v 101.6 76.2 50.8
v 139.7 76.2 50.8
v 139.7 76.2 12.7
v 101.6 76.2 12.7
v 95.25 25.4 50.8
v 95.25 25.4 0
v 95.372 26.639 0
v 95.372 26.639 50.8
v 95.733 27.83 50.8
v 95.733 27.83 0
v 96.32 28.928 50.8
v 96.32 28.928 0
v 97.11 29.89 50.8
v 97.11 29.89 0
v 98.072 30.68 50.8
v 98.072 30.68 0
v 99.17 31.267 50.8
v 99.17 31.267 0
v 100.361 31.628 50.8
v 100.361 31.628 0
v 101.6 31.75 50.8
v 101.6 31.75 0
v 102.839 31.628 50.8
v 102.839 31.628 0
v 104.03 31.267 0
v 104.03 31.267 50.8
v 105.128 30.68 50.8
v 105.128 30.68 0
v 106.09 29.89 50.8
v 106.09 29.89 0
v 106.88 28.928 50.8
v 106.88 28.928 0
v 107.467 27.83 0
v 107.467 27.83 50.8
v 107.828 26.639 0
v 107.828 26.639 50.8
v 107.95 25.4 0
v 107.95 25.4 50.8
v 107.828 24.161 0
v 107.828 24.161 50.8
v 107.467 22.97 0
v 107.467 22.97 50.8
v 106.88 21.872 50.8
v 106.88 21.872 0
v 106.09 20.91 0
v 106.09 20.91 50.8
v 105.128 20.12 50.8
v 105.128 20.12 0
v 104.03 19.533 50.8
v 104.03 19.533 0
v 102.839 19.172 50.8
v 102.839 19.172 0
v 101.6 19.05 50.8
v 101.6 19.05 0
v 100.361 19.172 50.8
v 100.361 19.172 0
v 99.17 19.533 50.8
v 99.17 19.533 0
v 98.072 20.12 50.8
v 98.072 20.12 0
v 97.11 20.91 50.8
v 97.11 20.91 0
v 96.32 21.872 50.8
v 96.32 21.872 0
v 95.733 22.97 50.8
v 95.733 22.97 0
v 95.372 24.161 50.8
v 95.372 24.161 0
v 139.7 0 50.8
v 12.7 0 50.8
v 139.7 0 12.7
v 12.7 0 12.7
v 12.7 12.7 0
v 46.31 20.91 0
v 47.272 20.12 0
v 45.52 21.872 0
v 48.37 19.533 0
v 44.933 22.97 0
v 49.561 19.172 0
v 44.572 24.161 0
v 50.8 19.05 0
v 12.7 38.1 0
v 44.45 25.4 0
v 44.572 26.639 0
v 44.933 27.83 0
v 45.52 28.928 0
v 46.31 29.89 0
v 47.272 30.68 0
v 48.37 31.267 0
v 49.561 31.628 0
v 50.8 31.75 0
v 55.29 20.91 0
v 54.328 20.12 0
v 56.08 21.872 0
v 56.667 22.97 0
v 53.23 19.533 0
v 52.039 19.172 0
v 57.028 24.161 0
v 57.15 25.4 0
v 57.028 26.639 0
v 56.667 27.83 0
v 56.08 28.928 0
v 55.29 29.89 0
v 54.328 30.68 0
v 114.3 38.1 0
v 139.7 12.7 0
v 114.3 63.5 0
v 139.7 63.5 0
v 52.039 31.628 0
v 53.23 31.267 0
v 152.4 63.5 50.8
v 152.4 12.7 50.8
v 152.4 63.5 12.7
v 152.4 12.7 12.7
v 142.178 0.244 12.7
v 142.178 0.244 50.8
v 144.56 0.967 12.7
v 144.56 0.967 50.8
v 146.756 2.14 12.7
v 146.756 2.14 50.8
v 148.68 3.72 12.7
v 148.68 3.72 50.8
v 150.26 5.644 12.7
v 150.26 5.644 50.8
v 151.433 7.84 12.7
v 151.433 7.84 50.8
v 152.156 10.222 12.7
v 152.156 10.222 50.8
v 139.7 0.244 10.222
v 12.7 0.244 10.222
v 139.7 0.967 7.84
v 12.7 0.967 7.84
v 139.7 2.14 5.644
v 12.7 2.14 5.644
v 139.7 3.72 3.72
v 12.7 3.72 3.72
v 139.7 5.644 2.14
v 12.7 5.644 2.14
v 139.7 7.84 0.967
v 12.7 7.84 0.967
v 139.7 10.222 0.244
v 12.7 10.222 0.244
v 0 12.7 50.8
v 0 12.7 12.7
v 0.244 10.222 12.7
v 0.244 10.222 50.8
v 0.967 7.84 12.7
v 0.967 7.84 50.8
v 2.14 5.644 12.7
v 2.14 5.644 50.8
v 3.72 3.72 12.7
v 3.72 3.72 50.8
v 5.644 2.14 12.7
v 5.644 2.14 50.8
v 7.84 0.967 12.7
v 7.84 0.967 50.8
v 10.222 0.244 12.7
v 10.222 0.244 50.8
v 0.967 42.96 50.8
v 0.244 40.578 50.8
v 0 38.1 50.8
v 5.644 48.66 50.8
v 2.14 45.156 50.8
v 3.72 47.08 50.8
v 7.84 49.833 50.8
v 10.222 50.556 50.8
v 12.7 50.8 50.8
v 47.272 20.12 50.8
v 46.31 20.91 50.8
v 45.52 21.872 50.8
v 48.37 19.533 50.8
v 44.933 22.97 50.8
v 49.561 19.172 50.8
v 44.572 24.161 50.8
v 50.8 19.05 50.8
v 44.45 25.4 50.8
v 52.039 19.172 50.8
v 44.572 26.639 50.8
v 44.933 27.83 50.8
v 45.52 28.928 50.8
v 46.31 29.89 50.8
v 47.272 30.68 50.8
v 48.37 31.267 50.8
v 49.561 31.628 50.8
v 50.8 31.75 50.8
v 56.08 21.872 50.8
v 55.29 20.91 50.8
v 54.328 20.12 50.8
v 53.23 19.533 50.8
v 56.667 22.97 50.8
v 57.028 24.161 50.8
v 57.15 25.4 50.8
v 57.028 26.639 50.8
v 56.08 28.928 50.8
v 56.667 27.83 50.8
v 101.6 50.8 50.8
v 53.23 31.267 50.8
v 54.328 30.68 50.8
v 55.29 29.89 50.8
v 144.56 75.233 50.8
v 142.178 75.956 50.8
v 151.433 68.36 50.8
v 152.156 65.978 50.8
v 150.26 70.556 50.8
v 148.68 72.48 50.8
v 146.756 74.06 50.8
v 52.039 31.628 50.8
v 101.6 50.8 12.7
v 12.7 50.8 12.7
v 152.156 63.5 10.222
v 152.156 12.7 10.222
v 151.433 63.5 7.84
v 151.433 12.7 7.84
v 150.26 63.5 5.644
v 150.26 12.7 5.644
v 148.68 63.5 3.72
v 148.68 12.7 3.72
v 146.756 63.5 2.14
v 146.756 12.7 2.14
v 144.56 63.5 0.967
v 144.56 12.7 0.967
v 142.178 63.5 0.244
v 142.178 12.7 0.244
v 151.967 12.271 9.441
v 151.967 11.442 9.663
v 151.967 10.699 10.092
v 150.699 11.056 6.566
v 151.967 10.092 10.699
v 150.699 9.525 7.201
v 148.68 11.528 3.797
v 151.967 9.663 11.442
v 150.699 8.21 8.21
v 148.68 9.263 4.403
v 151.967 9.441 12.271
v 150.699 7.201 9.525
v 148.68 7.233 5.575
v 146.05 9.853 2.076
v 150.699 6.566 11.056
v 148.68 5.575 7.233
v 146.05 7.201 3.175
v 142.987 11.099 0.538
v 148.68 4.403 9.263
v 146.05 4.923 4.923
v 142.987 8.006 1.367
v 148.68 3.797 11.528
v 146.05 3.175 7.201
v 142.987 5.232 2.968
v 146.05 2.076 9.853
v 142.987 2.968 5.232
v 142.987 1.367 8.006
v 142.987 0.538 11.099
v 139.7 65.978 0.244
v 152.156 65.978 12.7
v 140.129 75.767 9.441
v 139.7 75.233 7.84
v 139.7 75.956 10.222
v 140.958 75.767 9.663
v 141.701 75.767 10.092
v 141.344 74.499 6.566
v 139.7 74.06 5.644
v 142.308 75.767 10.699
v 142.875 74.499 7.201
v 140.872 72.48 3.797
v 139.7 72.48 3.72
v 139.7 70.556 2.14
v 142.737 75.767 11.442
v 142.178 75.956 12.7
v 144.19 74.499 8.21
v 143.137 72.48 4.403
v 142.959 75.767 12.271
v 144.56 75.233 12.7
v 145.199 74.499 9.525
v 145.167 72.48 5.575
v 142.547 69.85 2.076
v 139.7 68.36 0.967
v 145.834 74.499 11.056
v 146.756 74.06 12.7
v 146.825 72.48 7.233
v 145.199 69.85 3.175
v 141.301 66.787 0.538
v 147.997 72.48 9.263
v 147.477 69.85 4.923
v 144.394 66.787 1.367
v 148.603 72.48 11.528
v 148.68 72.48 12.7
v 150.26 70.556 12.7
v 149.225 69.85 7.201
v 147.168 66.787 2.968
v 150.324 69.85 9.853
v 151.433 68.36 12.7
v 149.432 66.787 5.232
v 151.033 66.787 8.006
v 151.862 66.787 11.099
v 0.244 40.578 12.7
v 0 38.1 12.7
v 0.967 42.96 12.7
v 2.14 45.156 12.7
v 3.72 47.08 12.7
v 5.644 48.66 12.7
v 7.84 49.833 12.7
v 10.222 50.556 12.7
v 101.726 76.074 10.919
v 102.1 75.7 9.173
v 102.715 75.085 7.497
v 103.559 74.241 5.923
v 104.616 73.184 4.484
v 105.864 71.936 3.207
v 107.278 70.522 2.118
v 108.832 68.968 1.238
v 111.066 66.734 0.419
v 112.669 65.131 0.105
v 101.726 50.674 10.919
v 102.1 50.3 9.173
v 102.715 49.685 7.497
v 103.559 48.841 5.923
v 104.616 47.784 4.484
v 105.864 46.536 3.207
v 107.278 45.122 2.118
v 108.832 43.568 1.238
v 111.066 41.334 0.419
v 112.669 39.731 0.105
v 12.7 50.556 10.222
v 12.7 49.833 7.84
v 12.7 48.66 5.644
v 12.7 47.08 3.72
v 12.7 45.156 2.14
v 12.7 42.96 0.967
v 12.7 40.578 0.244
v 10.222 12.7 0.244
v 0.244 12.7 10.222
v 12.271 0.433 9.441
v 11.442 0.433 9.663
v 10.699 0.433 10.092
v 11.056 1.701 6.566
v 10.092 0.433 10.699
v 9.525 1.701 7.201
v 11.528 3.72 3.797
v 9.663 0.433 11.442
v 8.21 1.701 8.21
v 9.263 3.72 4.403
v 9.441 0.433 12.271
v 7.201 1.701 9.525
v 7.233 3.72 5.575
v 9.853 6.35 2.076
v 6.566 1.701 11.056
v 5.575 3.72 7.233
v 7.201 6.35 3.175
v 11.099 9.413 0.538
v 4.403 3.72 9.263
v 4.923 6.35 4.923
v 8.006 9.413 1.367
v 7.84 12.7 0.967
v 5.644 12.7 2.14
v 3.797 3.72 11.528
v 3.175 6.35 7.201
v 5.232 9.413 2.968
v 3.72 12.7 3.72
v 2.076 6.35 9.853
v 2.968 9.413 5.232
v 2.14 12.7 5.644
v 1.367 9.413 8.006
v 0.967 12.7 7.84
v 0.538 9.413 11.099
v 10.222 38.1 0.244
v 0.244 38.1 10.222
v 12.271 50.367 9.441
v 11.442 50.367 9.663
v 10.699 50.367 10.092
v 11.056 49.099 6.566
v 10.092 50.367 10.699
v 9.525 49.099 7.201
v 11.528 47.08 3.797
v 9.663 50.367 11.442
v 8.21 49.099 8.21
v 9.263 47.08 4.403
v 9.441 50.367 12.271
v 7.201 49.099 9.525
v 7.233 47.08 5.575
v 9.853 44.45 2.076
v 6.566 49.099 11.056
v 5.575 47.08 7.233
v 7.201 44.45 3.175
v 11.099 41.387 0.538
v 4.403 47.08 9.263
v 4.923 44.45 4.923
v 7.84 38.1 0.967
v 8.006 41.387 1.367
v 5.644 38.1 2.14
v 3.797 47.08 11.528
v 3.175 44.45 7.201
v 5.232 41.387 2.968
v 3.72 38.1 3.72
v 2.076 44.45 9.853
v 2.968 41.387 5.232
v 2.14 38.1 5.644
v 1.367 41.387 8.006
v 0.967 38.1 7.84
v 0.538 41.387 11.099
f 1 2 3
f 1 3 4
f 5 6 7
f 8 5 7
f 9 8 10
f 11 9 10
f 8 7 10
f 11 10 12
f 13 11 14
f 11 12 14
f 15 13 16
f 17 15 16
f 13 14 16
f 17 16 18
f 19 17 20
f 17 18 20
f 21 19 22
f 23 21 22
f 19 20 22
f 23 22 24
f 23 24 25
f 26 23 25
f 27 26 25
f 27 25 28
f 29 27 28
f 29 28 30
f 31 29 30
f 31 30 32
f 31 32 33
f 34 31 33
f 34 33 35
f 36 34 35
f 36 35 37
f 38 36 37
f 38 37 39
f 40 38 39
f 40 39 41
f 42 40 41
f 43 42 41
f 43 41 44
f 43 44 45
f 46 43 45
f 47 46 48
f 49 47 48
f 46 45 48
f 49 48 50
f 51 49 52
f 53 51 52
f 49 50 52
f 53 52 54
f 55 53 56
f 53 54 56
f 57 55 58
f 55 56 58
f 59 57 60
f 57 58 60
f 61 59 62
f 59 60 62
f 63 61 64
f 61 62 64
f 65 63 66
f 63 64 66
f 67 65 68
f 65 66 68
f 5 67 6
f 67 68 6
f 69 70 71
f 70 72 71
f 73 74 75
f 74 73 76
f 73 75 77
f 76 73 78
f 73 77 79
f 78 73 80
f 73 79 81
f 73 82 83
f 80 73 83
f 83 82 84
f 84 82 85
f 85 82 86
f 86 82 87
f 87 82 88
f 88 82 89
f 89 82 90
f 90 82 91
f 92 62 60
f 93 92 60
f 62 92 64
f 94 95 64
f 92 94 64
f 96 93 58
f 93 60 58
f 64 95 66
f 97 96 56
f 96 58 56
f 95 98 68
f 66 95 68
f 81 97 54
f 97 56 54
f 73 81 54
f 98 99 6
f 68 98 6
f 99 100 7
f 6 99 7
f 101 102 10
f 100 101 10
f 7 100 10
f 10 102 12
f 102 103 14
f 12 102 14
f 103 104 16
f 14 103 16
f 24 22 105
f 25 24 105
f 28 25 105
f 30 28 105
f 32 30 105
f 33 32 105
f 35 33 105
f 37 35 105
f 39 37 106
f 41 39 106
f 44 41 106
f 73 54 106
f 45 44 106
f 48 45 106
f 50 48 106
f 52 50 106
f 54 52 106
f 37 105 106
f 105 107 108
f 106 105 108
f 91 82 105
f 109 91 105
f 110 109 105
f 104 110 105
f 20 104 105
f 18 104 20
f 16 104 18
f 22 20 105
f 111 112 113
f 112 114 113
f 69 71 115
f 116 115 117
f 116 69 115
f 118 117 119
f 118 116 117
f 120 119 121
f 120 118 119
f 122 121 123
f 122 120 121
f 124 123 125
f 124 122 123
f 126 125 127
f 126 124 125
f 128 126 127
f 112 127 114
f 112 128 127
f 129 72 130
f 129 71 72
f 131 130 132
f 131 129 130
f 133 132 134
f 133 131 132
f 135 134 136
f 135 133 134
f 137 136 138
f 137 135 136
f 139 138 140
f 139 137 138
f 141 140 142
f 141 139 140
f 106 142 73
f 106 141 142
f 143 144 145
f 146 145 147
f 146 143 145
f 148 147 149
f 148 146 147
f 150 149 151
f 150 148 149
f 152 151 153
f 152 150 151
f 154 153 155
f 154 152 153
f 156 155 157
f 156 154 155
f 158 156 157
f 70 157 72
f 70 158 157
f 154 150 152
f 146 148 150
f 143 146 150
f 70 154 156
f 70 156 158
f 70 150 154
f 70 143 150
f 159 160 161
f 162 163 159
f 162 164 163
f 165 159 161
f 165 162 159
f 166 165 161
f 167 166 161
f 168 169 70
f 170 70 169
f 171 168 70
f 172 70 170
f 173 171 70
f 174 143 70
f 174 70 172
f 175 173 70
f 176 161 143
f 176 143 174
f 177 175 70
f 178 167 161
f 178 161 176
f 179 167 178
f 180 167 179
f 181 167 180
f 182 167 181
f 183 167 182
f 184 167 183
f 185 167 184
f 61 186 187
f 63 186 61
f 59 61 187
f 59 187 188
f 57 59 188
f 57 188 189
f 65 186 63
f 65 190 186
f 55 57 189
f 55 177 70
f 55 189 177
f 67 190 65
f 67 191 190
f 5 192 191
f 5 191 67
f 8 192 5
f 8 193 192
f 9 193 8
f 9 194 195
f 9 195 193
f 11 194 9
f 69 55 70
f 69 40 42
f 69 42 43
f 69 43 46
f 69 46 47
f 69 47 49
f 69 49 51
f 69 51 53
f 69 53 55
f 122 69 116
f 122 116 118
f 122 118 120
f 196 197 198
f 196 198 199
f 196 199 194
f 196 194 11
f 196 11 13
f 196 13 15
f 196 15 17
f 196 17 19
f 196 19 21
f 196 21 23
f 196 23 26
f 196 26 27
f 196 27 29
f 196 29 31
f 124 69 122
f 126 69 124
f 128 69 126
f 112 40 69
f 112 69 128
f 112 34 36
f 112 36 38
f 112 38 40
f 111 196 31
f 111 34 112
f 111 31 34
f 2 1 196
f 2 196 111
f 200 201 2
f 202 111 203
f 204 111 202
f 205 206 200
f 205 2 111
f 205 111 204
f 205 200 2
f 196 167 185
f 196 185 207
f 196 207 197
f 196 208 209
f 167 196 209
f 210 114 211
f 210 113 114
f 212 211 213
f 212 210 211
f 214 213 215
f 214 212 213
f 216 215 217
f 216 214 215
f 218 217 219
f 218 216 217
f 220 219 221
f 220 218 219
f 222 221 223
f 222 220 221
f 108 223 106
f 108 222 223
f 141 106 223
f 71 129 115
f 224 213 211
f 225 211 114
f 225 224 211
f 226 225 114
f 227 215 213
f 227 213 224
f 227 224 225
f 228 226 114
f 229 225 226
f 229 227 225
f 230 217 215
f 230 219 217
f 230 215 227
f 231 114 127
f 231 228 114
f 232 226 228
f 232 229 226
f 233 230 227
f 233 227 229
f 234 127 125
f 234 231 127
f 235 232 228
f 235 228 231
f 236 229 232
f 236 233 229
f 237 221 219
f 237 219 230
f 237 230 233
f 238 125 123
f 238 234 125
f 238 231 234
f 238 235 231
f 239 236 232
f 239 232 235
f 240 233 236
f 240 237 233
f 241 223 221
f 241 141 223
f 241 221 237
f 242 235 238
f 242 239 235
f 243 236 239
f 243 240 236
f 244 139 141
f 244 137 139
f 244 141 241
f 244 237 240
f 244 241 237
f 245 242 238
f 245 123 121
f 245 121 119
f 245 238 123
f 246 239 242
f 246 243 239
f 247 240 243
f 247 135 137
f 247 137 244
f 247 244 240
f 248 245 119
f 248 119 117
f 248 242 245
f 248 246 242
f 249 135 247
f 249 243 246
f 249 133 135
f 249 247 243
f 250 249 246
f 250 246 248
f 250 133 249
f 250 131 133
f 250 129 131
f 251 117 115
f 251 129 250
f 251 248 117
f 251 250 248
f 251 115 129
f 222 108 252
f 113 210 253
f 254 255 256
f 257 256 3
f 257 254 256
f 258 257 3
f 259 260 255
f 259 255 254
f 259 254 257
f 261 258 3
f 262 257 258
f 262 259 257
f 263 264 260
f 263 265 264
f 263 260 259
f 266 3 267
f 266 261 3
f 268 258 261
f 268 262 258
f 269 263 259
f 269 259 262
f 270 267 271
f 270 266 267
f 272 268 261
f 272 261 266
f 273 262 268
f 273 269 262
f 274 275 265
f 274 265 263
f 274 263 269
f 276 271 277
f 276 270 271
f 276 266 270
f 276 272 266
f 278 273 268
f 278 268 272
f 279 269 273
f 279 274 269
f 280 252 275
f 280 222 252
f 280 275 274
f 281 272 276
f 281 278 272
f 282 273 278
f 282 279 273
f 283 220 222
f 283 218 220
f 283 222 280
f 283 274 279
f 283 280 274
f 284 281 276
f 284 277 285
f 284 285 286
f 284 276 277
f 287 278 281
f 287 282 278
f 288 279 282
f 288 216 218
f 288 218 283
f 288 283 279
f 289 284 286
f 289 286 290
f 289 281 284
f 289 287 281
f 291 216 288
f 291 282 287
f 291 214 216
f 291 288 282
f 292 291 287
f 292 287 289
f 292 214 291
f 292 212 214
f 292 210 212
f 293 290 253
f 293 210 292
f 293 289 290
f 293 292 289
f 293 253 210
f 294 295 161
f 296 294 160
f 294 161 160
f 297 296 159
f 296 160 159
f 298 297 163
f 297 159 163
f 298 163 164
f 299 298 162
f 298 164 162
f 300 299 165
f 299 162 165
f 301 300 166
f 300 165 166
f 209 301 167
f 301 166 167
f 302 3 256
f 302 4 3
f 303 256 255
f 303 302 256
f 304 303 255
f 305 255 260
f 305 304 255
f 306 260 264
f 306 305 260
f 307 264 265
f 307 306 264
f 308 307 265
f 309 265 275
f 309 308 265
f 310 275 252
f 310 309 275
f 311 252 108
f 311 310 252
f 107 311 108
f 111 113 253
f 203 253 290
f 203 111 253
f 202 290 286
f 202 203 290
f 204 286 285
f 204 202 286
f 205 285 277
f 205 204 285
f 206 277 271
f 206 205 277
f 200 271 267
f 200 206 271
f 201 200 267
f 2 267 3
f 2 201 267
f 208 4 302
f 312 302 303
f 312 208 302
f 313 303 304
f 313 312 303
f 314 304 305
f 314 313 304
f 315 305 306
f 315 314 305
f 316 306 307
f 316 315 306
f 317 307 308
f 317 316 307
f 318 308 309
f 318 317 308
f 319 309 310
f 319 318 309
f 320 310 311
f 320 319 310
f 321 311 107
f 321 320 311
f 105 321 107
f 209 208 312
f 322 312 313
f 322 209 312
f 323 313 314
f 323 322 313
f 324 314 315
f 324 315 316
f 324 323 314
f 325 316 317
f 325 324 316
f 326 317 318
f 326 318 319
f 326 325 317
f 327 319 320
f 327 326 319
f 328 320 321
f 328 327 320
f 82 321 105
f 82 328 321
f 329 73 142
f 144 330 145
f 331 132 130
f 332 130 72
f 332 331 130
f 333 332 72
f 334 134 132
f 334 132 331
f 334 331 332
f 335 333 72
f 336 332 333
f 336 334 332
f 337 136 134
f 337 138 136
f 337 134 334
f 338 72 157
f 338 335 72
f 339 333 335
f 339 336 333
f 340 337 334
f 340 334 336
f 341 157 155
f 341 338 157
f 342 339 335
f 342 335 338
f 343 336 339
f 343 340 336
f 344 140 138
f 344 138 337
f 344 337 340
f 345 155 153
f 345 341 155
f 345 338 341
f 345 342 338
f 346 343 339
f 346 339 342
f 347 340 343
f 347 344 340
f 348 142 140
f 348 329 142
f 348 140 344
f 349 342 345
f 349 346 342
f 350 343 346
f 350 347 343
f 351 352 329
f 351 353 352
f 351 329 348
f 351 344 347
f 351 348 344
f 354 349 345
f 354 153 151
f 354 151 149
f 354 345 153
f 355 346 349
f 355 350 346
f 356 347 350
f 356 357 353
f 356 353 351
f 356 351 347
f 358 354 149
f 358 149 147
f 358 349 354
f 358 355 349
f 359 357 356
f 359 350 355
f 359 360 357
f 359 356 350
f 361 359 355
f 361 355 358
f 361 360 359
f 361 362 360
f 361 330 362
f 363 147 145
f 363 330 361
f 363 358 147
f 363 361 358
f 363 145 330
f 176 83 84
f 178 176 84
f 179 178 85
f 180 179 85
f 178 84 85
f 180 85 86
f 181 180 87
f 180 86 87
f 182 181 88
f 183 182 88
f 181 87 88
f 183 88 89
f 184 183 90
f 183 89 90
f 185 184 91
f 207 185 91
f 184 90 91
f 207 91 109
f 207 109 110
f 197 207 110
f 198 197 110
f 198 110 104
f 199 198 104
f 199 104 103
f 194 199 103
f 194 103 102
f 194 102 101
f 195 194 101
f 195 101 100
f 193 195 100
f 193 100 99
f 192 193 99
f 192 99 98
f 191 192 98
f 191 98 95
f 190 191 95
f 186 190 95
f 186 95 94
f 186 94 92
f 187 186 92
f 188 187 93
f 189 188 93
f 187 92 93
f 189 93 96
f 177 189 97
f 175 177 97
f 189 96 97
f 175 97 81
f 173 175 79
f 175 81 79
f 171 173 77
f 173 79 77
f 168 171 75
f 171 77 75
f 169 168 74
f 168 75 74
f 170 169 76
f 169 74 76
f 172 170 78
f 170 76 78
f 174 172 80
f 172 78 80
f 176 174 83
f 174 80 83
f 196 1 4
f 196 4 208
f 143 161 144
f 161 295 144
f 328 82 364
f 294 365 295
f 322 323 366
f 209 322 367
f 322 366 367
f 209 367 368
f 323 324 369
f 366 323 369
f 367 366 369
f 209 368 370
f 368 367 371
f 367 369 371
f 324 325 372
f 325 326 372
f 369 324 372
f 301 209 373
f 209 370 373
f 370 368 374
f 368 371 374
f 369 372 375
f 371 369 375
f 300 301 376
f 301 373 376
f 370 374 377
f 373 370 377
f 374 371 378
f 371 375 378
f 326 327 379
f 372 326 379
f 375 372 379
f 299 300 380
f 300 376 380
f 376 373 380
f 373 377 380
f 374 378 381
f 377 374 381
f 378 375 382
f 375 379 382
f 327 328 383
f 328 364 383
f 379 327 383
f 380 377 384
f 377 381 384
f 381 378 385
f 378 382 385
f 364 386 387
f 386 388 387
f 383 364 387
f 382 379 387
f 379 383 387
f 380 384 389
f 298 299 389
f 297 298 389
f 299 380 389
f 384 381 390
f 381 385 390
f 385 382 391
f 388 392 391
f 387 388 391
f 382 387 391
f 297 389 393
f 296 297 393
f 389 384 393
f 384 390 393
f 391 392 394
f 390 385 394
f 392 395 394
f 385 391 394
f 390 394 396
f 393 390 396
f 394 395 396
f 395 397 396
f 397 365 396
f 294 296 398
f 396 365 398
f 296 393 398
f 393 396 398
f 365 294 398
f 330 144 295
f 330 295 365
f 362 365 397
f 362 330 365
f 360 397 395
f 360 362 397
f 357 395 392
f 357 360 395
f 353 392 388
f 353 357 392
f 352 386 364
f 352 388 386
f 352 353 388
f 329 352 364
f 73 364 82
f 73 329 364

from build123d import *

# Parameters (mm, degrees)
F1_DEPTH = 50.8
F2_R     = 12.7
F4_D     = 12.7


with BuildPart() as f1:
    # F0 (on Top) → F1 (new body)
    with BuildSketch(Plane.XY):
        Polygon((0, 50.8), (0, 0), (152.4, 0), (152.4, 76.2), (101.6, 76.2), (101.6, 50.8), align=None)
    extrude(amount=F1_DEPTH)

    # F2
    f2_edges = [f1.edges().sort_by_distance(p)[0] for p in [
        (0, 25.4, 0),
        (76.2, 0, 0),
        (152.4, 38.1, 0),
        (127, 76.2, 0),
        (101.6, 63.5, 0),
        (50.8, 50.8, 0),
        (152.4, 0, 25.4),
        (0, 0, 25.4),
        (0, 50.8, 25.4),
        (152.4, 76.2, 25.4),
    ]]
    fillet(f2_edges, radius=F2_R)

    # F4 (through all)
    with Locations(Plane.XY.offset(50.8)):
        with Locations((50.8, 25.4), (101.6, 25.4)):
            Hole(F4_D / 2)


solid = f1.part
